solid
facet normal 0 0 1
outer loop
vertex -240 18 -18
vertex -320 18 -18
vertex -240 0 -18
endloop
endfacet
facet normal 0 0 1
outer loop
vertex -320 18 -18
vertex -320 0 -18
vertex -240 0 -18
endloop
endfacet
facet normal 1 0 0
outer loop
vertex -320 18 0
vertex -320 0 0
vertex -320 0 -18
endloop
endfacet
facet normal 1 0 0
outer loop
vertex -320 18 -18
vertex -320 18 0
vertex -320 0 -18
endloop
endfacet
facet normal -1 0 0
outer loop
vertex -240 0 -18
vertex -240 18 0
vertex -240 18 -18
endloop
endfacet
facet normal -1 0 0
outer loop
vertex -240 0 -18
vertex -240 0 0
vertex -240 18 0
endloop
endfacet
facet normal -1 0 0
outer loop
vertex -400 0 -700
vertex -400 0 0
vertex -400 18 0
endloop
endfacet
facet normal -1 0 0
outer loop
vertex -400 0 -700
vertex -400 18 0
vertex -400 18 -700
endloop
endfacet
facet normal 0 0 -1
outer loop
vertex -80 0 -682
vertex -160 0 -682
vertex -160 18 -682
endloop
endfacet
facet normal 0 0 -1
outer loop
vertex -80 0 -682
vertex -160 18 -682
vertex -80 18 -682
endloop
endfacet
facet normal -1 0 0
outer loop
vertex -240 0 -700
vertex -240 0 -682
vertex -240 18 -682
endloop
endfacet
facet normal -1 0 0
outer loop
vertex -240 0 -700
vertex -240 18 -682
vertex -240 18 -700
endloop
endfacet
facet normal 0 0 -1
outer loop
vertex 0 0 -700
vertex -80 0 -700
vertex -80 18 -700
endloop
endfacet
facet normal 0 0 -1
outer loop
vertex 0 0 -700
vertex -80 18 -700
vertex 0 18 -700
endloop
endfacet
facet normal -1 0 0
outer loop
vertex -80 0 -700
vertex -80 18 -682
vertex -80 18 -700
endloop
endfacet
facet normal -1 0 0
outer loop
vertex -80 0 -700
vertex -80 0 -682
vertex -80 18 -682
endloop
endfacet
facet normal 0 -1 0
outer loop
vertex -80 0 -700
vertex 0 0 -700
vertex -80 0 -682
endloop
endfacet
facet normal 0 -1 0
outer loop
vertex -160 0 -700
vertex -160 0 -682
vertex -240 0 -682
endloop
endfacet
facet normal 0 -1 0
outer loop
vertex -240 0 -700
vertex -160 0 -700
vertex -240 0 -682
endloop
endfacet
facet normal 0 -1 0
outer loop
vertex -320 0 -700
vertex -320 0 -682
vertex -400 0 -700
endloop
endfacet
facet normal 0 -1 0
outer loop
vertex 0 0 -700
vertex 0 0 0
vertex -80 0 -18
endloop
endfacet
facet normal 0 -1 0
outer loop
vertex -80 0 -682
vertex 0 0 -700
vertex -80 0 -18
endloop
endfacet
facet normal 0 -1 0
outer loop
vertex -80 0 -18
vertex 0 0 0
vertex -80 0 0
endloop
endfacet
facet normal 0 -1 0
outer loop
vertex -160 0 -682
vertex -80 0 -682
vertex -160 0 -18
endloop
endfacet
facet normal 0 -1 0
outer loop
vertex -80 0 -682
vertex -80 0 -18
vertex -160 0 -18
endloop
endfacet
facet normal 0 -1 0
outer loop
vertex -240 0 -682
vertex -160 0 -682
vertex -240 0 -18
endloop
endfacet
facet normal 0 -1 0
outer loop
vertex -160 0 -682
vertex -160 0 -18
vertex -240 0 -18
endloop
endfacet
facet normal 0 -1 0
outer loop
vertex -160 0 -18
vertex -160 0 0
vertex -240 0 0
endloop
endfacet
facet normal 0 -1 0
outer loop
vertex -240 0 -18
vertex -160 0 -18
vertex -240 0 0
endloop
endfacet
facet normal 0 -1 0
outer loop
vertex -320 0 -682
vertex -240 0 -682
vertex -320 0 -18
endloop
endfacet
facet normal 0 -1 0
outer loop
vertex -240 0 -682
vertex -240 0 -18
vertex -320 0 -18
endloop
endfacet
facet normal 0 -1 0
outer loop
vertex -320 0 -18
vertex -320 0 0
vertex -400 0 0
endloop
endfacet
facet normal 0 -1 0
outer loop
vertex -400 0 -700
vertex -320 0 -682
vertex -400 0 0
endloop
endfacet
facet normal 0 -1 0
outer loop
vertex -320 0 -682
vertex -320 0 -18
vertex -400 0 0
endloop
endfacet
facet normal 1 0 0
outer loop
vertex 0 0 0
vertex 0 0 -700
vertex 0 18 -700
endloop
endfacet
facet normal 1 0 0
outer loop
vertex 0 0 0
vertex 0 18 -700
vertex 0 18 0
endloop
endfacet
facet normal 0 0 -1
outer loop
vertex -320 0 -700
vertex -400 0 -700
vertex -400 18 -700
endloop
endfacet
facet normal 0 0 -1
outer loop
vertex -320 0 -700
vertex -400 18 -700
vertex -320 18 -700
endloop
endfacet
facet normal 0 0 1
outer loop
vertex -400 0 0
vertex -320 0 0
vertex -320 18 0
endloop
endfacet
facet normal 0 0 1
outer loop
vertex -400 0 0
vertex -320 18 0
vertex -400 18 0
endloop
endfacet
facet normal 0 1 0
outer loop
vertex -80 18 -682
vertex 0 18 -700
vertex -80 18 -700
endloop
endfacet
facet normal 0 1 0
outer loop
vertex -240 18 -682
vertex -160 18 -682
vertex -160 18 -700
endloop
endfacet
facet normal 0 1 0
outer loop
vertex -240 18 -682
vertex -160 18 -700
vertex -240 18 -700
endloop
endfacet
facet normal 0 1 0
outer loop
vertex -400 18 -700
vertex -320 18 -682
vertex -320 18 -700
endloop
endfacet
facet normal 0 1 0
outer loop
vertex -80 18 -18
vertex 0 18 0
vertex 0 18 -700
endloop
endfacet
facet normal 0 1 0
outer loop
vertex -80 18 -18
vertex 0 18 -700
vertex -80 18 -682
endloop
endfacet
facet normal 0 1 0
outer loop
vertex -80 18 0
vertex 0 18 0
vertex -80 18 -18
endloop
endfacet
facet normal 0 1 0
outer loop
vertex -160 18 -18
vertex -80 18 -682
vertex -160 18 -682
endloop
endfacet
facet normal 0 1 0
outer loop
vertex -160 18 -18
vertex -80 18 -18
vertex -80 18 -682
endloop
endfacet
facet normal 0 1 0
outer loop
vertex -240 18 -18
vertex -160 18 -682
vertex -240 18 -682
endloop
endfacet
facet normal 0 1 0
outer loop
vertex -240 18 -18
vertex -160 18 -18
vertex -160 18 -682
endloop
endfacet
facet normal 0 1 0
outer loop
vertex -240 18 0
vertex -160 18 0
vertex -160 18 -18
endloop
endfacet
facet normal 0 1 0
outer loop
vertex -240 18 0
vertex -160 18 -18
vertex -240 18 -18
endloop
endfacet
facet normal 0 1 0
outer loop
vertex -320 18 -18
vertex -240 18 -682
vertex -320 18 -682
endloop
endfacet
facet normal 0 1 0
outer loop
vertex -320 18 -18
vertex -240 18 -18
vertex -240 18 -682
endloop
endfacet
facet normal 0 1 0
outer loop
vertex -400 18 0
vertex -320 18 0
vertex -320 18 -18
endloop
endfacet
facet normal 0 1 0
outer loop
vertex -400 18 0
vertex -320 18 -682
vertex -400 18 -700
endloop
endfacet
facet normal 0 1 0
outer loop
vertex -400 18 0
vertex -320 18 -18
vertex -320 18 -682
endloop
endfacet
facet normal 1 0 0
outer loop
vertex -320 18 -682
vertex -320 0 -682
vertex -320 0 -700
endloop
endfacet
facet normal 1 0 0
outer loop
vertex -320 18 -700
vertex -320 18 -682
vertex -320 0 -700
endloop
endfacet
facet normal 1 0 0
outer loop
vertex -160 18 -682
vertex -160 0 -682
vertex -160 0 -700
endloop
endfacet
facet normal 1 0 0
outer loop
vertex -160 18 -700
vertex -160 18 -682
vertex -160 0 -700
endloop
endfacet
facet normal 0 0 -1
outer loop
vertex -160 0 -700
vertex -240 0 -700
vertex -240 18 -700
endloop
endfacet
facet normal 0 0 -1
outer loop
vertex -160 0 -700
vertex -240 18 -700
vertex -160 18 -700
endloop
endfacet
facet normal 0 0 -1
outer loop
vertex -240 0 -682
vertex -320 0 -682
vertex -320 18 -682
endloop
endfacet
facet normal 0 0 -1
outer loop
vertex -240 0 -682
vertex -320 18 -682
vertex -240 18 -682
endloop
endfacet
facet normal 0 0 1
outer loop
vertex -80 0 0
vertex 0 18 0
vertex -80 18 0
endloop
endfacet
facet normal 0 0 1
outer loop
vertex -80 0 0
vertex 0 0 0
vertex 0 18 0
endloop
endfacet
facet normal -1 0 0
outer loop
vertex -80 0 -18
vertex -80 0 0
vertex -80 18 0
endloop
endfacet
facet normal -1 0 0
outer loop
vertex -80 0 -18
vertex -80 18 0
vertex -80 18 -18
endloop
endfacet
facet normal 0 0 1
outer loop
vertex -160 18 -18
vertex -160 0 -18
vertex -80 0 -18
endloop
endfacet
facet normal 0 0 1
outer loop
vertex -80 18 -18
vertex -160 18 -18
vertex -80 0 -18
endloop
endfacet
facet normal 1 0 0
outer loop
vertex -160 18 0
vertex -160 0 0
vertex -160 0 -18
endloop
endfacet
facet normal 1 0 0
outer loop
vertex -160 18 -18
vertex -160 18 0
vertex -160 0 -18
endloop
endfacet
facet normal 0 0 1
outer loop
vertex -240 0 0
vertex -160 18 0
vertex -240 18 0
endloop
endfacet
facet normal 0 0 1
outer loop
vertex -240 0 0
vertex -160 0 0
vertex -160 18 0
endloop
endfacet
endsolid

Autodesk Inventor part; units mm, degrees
ref_plane "YZ Plane" through (0, 0, 0) normal (1, 0, 0) x (0, 1, 0)
ref_plane "XZ Plane" through (0, 0, 0) normal (0, 1, 0) x (-1, 0, 0)
ref_plane "XY Plane" through (0, 0, 0) normal (0, 0, 1) x (1, 0, 0)
sketch "Sketch1" plane through (0, 0, 0) normal (0, 1, 0) x (-1, 0, 0)
  line L0 (400, 0) -> (400, -700)
  line L1 (0, -700) -> (0, 0)
  line L2 (320, -682) -> (320, -700)
  line L3 (240, -682) -> (240, -700)
  line L4 (160, -682) -> (160, -700)
  line L5 (320, 0) -> (320, -18)
  line L6 (240, 0) -> (240, -18)
  line L7 (160, 0) -> (160, -18)
  line L8 (80, 0) -> (80, -18)
  line L9 (80, -682) -> (80, -700)
  line L10 (320, -682) -> (240, -682)
  line L11 (160, -682) -> (80, -682)
  line L12 (80, -700) -> (0, -700)
  line L13 (400, -700) -> (320, -700)
  line L14 (240, -700) -> (160, -700)
  line L15 (320, -18) -> (240, -18)
  line L16 (160, -18) -> (80, -18)
  line L17 (0, 0) -> (80, 0)
  line L18 (160, 0) -> (240, 0)
  line L19 (320, 0) -> (400, 0)
  dimension "d60" = 700
  dimension "d61" = 400
  dimension "d64" = 80
  dimension "d65" = 80
  dimension "d66" = 80
  dimension "d67" = 80
  dimension "d69" = 80
  dimension "d70" = 80
  dimension "d71" = 80
  dimension "d72" = 18
extrude "Extrusion1" add sketch "Sketch1" along normal blind 18
properties part number "tapa supp"
